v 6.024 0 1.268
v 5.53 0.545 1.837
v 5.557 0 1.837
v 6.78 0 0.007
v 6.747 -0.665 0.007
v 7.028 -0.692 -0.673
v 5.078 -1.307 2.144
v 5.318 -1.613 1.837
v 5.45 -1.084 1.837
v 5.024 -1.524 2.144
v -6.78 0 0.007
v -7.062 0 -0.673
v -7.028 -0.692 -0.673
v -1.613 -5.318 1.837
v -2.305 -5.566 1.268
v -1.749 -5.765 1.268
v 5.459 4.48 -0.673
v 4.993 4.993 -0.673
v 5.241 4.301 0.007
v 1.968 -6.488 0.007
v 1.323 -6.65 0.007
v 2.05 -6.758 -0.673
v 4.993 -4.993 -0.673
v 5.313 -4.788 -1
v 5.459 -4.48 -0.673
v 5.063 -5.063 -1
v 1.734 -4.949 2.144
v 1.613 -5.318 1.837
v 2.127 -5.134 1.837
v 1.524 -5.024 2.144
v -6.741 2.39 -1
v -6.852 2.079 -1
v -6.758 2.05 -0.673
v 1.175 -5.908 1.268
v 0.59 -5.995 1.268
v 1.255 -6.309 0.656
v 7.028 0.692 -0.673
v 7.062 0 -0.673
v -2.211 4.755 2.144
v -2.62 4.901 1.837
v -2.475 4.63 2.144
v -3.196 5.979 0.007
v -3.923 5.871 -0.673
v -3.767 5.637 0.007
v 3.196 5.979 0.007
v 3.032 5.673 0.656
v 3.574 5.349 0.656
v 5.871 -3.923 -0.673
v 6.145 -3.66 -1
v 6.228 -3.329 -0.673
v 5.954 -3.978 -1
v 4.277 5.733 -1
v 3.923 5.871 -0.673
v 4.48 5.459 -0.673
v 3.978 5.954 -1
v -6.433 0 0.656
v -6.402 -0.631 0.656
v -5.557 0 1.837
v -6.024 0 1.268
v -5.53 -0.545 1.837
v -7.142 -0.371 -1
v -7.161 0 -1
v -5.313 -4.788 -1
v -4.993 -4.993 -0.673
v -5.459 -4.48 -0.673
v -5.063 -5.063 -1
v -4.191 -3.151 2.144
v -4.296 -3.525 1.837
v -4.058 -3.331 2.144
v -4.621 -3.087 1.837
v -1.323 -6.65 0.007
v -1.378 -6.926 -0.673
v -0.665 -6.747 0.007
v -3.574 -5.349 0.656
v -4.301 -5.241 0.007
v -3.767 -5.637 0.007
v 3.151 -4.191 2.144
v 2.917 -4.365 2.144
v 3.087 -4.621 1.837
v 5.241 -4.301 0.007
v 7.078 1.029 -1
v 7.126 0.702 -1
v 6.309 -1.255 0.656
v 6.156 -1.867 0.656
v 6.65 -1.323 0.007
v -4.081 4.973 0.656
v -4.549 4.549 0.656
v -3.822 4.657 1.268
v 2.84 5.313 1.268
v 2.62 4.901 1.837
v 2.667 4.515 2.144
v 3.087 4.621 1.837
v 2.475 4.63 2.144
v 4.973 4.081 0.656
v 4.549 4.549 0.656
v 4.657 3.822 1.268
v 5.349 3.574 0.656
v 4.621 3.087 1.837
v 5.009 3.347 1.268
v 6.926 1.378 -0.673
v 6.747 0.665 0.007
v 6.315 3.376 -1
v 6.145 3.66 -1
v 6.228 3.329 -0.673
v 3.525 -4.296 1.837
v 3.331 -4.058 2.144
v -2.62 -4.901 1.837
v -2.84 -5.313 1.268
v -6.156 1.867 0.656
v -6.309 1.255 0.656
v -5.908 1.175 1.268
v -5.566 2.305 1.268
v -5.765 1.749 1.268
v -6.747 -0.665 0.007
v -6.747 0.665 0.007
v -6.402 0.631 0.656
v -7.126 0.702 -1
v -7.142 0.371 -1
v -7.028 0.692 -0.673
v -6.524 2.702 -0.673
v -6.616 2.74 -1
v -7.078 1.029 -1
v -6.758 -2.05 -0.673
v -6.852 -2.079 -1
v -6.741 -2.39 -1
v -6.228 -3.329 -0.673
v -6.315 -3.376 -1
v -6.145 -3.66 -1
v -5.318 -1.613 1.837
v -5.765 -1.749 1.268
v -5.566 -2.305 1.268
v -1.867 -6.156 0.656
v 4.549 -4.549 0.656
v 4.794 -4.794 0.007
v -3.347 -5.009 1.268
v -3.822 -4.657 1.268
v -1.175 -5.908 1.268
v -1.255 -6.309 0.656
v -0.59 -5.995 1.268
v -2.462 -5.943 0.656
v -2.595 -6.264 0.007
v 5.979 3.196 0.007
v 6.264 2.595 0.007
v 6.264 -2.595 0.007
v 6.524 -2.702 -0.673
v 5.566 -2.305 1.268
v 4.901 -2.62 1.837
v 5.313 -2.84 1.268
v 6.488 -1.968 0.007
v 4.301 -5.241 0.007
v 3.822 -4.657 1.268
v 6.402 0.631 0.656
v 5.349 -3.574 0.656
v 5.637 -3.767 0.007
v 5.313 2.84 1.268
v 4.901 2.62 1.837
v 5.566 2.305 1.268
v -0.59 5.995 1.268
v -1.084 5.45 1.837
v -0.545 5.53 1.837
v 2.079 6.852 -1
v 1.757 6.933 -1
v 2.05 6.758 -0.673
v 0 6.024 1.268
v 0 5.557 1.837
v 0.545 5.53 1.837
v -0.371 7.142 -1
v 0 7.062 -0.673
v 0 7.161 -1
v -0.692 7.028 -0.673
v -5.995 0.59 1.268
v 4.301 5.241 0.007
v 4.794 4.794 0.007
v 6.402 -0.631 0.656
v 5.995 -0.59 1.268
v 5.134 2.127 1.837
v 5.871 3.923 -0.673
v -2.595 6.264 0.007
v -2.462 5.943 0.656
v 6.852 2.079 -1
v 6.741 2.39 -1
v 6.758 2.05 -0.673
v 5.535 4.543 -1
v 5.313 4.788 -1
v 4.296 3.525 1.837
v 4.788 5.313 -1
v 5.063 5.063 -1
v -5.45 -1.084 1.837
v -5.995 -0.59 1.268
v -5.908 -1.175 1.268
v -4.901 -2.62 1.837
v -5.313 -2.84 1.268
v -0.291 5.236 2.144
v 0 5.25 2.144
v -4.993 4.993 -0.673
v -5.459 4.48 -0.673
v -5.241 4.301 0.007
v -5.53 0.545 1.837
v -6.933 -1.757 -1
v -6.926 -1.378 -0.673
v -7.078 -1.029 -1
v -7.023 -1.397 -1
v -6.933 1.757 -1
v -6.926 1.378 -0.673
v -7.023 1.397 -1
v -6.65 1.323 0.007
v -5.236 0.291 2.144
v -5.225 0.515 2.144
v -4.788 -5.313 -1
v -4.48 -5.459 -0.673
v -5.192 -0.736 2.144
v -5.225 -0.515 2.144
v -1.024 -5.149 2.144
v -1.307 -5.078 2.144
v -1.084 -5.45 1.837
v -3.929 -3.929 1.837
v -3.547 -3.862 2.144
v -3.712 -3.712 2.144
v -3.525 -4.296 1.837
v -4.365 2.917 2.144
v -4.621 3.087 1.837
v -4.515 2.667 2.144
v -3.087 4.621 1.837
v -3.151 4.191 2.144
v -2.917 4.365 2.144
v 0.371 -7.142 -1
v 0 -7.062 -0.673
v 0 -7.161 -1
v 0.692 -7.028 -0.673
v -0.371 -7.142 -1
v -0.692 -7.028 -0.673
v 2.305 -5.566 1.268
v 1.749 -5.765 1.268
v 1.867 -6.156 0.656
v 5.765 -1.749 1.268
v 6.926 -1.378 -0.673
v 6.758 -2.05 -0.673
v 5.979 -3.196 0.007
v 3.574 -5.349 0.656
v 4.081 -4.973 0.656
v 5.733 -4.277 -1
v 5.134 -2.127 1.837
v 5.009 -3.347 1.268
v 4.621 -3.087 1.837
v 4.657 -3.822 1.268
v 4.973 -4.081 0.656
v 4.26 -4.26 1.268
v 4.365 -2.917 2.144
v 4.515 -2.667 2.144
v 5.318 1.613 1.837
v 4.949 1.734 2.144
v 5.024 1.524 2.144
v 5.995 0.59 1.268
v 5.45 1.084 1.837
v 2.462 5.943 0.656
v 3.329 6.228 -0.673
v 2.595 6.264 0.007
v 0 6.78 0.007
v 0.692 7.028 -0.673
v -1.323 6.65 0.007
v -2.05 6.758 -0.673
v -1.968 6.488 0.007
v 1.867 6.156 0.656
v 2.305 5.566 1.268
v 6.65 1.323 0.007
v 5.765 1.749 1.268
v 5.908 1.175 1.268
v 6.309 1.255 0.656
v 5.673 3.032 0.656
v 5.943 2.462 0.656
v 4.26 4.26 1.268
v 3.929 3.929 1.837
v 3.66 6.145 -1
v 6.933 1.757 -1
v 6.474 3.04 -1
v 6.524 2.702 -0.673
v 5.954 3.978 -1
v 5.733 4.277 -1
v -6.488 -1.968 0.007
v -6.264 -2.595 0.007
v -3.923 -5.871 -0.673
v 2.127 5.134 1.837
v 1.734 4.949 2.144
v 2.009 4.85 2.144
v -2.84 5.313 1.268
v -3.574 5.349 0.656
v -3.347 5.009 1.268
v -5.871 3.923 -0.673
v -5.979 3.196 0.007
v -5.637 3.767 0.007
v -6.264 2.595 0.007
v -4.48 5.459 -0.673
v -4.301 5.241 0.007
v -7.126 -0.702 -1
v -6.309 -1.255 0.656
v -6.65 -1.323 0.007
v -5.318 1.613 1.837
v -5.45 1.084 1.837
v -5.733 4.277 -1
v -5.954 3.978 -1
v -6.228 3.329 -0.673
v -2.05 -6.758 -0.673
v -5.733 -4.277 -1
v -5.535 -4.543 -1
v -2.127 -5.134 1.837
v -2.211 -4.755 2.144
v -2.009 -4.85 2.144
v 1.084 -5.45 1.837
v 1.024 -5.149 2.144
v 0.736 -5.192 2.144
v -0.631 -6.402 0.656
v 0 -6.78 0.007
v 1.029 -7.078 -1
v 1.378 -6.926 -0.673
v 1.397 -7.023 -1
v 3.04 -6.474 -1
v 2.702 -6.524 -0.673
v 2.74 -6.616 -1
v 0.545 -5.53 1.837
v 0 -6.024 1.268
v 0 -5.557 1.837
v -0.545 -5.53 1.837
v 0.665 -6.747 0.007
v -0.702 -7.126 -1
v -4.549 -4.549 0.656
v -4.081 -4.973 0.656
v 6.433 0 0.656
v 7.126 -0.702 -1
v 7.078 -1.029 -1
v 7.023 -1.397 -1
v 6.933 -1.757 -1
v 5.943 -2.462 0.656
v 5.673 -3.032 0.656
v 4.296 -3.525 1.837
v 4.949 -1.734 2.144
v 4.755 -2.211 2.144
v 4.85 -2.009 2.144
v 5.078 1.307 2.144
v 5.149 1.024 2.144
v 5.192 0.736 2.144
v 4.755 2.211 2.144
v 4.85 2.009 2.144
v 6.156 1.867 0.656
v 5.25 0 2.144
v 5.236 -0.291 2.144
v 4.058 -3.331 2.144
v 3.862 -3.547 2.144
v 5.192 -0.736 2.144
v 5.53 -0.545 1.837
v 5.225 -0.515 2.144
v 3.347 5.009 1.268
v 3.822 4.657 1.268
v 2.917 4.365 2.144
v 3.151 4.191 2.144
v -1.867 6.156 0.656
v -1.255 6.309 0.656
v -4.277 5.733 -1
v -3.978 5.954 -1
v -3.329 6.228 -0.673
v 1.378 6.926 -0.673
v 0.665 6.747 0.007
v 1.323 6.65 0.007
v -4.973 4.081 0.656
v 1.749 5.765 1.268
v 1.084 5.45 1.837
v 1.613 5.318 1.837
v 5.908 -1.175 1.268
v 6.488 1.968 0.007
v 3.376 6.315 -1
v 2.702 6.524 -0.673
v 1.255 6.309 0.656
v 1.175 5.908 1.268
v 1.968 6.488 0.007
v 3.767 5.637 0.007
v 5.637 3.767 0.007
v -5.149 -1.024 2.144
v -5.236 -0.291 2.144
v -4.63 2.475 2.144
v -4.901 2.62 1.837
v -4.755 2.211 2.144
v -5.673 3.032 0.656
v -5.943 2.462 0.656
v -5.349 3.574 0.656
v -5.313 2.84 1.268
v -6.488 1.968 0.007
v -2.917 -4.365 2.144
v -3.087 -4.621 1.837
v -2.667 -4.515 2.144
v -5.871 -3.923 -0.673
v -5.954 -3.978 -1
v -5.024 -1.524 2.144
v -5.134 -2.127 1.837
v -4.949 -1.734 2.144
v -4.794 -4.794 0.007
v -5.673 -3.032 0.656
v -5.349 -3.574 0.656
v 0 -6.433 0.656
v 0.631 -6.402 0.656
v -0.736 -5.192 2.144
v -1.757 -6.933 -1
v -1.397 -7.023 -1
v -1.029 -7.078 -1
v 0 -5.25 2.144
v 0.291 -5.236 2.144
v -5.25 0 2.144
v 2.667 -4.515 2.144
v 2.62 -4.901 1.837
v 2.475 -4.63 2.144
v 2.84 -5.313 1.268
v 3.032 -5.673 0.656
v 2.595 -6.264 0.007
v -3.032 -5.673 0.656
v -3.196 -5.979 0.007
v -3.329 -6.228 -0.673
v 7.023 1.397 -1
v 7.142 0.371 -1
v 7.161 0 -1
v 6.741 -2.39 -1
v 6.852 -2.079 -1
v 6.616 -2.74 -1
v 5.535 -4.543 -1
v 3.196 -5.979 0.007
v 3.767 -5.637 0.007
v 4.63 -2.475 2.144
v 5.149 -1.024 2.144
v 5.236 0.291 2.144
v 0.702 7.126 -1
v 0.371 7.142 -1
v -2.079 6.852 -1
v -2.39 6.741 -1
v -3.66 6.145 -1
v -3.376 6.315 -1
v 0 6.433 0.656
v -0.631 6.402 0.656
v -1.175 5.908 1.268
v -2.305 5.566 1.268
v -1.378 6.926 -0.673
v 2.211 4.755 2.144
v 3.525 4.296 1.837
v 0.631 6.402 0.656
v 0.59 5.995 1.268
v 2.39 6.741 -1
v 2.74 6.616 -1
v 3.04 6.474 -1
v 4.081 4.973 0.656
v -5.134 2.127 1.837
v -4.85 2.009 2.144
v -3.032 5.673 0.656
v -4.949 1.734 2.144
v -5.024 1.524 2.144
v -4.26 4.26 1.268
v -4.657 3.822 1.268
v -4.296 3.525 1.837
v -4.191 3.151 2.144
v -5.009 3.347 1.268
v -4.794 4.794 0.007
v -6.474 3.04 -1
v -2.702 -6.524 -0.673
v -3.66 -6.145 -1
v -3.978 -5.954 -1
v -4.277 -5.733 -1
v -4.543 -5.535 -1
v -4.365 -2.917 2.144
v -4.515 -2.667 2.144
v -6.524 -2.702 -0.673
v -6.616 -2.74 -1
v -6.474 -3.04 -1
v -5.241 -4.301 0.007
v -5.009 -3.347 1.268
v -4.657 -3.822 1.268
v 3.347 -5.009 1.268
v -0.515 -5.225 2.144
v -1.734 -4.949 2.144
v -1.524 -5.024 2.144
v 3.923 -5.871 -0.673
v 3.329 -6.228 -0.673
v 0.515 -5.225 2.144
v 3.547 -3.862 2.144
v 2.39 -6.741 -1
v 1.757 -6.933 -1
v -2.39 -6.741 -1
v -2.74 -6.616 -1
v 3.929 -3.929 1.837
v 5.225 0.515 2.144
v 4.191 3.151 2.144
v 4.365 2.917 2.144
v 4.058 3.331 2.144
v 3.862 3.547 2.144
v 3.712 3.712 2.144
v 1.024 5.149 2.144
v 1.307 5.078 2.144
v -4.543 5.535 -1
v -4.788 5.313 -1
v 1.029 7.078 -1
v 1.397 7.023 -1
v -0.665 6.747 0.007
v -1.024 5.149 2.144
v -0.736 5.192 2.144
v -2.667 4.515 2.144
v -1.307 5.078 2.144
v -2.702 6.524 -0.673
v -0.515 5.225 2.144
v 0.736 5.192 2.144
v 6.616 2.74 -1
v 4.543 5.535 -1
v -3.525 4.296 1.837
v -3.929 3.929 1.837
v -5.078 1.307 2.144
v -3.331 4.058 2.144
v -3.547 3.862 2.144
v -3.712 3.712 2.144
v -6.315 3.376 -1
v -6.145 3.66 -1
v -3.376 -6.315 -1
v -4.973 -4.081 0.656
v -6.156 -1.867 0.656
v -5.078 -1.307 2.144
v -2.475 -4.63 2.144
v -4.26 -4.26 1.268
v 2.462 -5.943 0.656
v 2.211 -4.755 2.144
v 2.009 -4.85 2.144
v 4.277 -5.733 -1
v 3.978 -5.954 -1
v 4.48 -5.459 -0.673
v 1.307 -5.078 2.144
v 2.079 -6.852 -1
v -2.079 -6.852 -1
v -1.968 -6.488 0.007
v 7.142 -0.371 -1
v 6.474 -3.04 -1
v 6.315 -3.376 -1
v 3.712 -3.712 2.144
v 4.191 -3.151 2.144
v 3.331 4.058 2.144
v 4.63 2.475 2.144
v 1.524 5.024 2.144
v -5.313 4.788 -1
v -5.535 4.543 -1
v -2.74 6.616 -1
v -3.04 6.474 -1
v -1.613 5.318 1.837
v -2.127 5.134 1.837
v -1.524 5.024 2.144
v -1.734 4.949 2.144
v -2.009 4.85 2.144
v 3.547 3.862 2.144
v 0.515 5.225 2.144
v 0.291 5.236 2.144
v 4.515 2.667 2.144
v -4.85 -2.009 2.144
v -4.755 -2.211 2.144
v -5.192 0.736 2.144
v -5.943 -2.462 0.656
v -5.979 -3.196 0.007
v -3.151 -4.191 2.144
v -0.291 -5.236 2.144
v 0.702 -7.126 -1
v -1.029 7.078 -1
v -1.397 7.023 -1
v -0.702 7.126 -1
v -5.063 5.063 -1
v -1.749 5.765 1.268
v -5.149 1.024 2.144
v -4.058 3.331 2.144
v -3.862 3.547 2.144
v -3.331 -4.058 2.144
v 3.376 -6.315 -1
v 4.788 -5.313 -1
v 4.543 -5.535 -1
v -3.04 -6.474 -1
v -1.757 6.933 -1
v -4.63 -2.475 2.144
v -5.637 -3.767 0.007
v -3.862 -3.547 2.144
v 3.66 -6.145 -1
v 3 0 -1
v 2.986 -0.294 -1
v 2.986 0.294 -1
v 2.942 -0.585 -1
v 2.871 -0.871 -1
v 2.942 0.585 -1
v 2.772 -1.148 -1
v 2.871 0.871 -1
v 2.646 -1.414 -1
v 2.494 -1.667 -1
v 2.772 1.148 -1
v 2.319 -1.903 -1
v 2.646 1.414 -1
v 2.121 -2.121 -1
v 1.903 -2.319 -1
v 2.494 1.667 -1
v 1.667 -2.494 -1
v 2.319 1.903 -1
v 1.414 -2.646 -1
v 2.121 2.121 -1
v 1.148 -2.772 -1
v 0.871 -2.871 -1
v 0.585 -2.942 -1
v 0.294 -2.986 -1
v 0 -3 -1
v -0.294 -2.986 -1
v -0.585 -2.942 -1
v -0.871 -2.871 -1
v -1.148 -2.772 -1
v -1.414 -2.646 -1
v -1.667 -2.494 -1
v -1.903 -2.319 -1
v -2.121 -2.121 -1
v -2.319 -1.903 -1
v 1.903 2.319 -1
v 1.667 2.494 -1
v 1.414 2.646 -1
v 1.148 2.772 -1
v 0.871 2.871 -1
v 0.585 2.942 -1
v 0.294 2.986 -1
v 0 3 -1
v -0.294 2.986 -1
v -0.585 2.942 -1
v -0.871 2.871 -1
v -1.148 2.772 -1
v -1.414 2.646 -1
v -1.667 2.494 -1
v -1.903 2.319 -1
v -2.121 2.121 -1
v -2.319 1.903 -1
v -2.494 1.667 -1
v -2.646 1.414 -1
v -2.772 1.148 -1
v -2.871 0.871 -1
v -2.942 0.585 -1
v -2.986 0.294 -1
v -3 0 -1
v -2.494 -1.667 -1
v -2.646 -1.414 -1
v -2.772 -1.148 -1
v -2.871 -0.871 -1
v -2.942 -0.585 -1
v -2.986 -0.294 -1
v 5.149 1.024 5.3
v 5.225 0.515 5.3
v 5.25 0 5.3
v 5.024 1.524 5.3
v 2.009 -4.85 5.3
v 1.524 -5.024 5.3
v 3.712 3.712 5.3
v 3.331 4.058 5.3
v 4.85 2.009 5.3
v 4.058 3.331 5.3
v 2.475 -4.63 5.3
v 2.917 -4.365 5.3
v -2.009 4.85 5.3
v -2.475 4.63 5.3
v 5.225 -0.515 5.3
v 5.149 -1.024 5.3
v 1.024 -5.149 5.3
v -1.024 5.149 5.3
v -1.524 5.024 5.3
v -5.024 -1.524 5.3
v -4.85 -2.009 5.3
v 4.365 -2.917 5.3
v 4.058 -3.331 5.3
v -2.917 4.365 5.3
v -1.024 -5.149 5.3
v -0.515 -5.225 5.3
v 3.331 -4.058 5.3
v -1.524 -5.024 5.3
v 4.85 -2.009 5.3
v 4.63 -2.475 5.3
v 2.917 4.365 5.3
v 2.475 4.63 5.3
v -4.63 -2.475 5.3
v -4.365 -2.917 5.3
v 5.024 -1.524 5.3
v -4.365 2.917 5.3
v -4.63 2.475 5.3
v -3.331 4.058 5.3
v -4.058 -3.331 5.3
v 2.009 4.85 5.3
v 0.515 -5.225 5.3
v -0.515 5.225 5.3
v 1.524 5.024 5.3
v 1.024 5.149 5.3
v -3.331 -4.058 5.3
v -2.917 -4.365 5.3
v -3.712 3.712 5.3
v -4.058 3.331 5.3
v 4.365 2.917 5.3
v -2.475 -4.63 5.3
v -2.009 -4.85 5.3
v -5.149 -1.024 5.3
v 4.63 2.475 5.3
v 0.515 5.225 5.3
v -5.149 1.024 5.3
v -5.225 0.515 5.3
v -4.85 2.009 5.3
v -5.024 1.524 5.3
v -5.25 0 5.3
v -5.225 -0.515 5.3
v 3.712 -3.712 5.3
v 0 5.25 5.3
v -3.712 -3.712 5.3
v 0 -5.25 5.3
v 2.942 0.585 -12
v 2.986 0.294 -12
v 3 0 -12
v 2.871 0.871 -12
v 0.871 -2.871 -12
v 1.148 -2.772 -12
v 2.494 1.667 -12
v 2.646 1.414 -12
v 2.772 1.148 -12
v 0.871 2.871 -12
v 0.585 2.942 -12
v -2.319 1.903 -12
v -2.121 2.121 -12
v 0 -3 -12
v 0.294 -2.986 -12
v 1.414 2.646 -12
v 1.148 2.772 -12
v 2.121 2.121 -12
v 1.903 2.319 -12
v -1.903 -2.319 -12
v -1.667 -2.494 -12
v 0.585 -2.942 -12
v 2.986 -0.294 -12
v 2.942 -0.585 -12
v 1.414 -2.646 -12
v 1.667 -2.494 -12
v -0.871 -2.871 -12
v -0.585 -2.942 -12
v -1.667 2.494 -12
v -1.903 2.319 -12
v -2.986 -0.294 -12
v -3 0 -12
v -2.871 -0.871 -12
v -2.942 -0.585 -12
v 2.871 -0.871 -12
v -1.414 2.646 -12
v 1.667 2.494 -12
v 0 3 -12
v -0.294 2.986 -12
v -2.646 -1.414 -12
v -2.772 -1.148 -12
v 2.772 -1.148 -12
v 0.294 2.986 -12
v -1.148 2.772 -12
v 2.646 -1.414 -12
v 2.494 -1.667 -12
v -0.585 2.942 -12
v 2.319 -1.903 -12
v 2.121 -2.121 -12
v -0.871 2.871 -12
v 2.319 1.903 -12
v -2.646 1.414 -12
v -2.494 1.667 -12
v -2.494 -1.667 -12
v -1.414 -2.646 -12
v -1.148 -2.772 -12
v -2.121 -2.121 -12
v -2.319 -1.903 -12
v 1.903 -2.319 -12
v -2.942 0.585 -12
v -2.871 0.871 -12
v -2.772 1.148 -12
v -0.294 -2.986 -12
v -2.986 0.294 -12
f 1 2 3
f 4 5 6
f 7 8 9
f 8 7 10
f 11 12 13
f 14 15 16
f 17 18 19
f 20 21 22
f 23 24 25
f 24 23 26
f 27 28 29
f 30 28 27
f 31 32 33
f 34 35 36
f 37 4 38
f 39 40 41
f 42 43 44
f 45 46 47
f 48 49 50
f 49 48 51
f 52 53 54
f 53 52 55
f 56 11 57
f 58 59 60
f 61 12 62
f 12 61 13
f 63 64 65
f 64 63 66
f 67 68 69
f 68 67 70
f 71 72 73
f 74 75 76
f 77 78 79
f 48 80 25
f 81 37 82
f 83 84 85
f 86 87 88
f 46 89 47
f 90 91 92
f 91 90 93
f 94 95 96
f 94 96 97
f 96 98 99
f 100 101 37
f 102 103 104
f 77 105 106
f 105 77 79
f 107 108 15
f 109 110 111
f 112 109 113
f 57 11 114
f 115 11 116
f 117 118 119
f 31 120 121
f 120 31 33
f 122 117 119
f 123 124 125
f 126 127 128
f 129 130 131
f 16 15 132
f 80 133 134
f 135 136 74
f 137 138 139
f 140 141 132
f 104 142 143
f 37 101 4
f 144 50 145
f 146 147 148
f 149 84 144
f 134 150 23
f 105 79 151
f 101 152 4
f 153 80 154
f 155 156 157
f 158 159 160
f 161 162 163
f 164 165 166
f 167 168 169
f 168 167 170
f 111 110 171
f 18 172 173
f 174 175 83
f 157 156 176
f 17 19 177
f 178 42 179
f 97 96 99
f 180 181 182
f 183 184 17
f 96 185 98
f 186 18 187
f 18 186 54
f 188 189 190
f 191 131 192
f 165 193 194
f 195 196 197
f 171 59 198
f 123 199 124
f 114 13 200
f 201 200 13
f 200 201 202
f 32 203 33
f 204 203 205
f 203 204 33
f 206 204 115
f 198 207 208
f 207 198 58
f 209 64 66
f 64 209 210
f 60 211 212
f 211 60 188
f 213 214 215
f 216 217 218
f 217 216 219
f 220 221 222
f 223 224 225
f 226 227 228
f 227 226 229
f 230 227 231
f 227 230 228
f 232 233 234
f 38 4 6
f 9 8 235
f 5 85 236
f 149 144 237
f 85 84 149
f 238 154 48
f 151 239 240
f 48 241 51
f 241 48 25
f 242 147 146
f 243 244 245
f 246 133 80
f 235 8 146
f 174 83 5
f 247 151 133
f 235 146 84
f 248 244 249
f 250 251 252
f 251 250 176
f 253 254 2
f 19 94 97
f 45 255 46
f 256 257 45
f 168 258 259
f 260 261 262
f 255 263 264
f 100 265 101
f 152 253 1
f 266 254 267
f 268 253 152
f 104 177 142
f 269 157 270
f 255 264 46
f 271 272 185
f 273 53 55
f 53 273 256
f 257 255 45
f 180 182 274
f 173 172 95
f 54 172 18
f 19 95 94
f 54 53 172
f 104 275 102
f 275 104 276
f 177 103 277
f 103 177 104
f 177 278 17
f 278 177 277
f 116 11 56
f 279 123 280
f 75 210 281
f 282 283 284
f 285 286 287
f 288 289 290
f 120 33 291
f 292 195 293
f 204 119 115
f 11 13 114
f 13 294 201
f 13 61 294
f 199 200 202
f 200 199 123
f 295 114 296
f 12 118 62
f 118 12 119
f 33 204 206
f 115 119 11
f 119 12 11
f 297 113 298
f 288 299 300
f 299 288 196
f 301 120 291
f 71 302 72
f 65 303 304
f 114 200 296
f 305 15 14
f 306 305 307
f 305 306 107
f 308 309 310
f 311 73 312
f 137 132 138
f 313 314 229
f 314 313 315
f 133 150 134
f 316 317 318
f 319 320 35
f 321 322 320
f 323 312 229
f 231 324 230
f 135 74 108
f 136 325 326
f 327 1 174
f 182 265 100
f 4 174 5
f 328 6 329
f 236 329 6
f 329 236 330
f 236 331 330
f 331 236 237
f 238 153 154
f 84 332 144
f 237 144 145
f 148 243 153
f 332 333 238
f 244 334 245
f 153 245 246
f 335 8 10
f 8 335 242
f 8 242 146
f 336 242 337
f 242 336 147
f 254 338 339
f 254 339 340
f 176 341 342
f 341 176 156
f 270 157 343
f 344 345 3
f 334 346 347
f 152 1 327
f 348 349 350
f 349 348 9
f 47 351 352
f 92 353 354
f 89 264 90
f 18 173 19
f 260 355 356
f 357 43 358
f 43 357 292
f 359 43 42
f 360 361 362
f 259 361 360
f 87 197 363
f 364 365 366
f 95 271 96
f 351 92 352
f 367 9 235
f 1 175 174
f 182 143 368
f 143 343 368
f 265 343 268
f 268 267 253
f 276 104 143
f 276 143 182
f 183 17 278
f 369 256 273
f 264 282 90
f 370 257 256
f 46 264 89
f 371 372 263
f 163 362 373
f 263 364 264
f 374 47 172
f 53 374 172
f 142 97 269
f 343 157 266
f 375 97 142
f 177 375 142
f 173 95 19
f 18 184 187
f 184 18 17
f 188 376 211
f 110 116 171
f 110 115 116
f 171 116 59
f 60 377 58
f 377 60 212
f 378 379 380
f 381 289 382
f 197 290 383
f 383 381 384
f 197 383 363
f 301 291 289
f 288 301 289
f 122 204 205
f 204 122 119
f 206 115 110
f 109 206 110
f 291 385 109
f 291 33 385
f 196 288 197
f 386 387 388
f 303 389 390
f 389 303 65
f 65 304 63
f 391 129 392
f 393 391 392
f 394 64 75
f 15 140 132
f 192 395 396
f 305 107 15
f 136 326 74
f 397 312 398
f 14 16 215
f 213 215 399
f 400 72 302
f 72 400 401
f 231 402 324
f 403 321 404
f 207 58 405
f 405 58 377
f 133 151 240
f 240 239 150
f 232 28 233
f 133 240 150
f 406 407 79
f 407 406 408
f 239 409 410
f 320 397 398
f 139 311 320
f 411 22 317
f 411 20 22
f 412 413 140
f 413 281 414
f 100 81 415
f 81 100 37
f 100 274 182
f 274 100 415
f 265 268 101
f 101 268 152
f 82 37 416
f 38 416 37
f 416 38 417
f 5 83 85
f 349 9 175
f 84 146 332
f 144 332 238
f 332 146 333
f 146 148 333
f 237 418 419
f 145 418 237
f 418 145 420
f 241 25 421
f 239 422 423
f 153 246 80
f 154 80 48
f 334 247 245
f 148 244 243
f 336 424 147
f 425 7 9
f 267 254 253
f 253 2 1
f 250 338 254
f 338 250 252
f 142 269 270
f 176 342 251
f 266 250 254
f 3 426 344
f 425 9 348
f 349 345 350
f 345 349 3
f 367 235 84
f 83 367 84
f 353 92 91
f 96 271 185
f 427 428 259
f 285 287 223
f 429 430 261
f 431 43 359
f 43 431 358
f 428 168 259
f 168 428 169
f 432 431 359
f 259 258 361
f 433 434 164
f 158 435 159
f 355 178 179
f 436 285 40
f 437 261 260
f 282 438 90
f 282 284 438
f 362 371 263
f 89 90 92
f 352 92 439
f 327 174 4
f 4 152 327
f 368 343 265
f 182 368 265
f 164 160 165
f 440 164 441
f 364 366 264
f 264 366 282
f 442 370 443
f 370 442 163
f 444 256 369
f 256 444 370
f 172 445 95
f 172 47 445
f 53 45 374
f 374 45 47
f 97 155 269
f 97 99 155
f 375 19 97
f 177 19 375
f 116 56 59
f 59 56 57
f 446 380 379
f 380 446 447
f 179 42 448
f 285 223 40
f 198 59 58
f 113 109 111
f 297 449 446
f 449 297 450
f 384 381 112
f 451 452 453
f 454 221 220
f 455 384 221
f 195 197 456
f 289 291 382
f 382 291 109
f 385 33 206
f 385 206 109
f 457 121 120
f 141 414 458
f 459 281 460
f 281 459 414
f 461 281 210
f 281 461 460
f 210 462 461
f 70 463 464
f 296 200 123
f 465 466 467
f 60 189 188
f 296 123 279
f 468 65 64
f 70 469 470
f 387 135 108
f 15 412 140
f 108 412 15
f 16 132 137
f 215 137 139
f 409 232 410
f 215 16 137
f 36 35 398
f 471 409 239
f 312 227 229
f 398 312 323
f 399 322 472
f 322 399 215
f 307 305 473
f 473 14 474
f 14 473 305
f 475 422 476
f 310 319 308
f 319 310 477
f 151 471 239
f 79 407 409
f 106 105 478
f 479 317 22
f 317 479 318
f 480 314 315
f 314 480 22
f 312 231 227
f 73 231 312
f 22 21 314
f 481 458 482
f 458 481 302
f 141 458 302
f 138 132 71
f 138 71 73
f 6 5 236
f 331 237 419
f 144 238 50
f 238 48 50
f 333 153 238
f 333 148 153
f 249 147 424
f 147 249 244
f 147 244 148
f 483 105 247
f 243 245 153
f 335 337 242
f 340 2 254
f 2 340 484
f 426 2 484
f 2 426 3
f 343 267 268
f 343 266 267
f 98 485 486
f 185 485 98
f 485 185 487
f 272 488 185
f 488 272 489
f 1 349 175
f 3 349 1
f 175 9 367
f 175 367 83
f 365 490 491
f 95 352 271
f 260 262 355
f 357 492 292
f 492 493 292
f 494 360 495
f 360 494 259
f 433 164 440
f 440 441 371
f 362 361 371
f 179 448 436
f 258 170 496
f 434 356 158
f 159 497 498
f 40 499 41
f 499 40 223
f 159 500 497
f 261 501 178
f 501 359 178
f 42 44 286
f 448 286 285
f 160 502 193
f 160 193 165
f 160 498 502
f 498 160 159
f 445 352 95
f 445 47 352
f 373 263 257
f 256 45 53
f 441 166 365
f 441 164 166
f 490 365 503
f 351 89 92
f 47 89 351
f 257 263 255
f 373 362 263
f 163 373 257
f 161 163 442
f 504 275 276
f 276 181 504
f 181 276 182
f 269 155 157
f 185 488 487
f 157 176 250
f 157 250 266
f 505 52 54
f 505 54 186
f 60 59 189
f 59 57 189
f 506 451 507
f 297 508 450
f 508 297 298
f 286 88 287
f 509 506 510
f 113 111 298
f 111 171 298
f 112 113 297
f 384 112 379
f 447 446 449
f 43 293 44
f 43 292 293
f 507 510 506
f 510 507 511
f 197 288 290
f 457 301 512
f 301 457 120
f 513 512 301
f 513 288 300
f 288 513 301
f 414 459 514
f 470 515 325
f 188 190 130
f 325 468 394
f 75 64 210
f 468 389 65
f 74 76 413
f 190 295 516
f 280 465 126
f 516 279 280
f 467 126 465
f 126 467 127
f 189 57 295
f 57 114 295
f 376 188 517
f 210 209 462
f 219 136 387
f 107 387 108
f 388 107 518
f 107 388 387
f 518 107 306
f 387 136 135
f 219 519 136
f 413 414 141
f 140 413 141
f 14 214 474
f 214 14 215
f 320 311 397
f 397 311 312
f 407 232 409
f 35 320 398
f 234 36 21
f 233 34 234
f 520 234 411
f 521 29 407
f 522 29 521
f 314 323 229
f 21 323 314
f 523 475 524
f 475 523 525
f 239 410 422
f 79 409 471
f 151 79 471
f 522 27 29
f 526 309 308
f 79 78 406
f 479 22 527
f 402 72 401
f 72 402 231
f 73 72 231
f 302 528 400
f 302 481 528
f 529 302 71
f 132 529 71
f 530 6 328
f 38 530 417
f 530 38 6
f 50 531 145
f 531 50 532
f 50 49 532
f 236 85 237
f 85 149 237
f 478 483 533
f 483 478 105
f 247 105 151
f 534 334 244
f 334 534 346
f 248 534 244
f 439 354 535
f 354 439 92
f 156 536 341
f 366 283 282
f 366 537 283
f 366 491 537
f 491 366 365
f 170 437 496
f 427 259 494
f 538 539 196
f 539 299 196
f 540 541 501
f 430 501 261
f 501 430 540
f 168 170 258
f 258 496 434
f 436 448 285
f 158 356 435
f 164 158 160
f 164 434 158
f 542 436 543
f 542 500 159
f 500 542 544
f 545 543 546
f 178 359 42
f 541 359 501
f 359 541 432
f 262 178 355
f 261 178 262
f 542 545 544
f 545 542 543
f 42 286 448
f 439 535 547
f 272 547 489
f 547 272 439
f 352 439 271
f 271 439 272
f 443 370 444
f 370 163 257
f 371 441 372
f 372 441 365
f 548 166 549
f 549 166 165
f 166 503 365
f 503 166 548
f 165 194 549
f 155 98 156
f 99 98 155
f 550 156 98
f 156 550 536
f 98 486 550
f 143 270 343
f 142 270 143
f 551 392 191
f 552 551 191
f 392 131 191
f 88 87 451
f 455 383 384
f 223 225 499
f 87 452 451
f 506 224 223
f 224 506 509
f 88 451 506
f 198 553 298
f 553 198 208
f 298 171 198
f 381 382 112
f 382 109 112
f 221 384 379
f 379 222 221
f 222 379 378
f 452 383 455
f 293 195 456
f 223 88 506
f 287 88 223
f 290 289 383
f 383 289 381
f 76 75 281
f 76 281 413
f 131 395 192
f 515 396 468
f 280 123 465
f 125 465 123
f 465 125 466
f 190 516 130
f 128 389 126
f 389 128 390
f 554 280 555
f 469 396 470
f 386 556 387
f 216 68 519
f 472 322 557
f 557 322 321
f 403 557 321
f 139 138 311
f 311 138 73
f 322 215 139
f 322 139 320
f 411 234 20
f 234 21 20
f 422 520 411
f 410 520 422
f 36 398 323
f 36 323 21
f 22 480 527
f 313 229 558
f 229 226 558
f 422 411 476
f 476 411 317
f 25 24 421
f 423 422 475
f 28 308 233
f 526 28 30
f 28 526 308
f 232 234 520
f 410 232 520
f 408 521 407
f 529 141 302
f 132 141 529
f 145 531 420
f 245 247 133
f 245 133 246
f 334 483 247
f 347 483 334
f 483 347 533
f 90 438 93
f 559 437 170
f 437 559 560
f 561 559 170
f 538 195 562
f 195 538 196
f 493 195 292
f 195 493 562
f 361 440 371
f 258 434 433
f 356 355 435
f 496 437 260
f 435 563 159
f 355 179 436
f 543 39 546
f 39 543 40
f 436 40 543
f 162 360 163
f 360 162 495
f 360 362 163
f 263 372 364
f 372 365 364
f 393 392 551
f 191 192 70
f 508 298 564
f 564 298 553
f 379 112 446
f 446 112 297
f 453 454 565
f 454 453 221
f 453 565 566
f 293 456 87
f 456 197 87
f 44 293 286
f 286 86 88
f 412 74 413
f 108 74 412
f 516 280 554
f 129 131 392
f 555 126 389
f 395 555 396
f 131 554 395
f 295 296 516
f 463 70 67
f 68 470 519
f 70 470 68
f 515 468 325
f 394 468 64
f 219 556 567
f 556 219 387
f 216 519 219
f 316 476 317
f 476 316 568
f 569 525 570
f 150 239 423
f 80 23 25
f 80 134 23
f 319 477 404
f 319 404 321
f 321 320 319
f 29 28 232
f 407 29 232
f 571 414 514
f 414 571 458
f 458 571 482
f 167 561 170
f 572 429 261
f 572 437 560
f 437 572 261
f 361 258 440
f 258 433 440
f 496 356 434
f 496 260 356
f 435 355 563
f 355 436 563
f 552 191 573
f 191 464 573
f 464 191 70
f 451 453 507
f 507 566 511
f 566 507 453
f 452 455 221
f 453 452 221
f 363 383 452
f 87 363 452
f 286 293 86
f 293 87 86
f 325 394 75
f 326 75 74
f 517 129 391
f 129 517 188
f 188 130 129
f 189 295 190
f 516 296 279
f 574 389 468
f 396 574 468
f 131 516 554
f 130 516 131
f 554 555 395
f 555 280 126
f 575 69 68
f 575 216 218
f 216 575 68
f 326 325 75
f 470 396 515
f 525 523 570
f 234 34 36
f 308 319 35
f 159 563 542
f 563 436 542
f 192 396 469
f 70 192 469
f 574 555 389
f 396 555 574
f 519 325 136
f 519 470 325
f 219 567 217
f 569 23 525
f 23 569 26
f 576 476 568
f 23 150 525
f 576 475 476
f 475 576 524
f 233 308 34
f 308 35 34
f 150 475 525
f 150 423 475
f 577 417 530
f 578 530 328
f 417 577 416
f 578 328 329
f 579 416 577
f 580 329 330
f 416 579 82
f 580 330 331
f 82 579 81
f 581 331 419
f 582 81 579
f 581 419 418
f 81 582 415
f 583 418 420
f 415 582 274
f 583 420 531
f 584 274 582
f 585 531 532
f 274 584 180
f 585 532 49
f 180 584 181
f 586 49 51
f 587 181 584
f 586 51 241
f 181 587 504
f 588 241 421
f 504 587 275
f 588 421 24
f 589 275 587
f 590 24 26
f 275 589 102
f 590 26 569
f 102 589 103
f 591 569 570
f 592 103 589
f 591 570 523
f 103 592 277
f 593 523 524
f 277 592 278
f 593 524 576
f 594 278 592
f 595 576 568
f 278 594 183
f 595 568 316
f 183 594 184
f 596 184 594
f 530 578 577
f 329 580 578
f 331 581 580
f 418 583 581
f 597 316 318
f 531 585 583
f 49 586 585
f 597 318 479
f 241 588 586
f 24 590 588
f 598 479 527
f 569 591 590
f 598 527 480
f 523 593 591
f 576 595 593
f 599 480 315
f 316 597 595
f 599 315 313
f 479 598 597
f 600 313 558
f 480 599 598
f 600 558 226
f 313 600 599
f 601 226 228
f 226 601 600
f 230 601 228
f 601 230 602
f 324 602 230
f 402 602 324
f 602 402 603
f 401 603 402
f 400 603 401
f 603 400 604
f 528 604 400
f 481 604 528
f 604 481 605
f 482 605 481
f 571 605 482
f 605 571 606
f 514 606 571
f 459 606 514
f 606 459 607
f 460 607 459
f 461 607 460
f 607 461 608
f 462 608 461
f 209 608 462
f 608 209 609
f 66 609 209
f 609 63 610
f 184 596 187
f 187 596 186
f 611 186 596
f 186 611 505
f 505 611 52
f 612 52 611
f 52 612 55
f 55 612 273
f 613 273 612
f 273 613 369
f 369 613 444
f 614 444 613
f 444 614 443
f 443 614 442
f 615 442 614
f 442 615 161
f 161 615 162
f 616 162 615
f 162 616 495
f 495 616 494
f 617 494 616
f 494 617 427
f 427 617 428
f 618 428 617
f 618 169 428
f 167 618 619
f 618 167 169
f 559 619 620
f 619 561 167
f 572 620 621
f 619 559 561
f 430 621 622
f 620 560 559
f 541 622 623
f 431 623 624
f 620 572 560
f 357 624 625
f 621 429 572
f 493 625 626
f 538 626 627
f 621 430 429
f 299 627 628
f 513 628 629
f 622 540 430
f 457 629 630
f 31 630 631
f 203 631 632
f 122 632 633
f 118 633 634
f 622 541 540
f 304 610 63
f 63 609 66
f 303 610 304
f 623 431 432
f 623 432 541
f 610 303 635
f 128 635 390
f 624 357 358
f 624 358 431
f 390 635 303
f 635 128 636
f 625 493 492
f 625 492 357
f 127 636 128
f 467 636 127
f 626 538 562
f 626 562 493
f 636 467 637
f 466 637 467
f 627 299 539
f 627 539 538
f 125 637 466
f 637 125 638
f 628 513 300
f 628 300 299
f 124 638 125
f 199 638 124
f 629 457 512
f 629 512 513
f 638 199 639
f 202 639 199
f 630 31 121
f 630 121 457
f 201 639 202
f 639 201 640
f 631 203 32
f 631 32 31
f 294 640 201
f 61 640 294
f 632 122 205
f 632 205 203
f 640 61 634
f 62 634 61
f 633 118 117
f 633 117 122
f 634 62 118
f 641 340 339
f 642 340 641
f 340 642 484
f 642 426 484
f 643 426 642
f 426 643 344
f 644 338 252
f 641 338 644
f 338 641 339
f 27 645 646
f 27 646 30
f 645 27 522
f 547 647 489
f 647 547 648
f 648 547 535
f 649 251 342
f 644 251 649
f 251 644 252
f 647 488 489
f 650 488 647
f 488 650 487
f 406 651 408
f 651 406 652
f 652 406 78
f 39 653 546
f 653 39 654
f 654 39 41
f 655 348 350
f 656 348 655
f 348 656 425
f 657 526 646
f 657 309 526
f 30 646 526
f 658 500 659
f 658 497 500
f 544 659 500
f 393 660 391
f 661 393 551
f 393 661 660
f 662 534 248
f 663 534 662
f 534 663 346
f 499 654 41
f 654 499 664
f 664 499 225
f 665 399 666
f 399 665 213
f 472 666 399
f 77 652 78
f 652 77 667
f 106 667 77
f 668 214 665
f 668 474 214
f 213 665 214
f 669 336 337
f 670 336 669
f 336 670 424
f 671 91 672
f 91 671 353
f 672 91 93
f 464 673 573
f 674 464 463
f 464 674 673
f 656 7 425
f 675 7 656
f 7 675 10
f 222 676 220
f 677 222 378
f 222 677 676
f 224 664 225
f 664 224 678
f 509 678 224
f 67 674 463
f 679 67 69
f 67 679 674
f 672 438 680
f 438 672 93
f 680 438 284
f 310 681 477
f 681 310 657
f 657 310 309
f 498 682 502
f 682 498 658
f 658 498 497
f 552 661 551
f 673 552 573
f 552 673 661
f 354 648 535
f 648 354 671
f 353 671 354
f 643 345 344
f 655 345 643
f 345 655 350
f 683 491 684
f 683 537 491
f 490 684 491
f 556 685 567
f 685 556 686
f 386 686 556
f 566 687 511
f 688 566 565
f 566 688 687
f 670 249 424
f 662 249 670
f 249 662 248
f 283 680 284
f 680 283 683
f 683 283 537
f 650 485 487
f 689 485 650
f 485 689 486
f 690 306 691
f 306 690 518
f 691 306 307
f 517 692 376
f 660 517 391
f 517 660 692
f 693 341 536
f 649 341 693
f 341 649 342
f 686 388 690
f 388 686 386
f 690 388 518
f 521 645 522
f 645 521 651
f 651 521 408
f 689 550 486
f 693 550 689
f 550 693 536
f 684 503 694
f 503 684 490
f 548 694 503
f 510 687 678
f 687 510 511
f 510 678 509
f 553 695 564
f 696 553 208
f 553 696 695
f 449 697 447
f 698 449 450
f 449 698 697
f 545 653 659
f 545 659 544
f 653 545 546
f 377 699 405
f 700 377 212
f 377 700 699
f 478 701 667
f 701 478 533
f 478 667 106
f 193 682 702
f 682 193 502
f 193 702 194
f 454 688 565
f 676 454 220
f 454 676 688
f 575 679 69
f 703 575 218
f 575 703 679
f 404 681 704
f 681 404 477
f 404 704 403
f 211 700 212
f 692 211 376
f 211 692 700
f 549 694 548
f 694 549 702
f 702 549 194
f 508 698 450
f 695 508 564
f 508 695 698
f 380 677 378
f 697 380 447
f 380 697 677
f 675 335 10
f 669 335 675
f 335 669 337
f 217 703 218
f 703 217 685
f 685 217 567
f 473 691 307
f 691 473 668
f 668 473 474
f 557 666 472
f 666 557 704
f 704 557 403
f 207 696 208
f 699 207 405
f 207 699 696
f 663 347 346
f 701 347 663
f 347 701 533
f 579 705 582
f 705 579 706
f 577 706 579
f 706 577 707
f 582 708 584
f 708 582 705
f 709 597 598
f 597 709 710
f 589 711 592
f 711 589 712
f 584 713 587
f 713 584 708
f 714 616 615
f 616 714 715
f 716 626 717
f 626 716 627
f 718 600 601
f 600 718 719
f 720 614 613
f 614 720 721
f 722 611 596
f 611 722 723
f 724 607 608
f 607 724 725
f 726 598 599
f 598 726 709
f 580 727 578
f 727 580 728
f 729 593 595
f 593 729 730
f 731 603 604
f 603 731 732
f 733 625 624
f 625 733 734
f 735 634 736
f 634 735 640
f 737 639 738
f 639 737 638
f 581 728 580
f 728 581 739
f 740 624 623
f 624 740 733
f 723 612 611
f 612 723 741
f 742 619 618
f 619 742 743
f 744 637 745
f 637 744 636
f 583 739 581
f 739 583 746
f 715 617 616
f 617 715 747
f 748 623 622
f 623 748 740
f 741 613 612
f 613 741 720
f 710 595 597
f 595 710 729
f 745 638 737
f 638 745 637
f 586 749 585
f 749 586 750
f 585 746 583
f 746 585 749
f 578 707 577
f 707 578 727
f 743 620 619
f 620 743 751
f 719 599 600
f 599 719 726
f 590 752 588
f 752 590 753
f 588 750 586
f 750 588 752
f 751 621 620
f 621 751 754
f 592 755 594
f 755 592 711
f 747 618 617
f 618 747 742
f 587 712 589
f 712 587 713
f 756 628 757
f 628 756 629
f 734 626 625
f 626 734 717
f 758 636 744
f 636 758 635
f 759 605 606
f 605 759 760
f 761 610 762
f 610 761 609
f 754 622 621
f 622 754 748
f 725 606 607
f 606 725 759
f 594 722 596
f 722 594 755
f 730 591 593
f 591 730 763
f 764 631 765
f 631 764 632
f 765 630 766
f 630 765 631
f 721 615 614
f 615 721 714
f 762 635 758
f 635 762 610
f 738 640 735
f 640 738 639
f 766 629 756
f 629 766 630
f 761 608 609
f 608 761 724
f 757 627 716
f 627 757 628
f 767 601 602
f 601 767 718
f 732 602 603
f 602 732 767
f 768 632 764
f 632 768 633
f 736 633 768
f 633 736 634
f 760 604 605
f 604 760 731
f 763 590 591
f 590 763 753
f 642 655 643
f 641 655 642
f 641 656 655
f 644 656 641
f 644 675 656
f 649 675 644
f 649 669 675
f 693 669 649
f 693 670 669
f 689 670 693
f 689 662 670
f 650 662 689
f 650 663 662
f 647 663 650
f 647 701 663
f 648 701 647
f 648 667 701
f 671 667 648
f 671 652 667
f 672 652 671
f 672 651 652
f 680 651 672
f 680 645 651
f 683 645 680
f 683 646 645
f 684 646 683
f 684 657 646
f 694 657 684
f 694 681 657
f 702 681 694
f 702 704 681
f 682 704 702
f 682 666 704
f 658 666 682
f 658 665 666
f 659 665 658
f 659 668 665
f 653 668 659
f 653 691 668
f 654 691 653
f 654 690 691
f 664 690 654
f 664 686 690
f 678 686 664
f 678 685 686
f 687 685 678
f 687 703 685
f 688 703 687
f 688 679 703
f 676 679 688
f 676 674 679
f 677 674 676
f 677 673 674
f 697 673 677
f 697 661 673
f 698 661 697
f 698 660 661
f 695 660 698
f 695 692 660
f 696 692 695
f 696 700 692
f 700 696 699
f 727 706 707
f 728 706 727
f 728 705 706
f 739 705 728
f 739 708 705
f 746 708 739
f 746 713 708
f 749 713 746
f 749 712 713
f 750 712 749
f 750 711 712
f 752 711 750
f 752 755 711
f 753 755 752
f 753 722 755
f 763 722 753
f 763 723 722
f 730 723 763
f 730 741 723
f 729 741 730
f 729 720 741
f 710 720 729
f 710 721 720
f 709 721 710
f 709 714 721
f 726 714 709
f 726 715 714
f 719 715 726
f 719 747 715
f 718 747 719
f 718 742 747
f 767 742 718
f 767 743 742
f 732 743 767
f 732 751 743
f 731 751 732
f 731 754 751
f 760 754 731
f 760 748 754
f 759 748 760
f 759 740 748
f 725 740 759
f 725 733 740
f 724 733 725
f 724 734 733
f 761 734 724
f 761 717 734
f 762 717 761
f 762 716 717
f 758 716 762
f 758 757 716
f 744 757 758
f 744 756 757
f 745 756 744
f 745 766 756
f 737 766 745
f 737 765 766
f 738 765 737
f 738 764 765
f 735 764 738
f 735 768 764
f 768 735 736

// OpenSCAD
// Parameters
shaft_diameter_mm = 6; //[3:12:0.1]
head_diameter_mm  = 10.5; //[5.25:21:0.1]
head_height_mm    = 3.3; //[1.65:6.6:0.1]
length_mm         = 10; //[5:20:0.5]
dome_sphere_radius_mm = 7.5; //[4:15:0.1]
overlap_mm        = 1; //[0.5:2:0.1]

// Screw (single connected solid)
module screw() {
  union() {
    // Place head so its bottom is at z=0 and top at z=head_height_mm
    // This makes it easy to attach shaft below and any cap above.
    // Head (cylindrical portion)
    translate([0, 0, head_height_mm/2])
      cylinder(h=head_height_mm, r=head_diameter_mm/2, center=true, $fn=64);

    // Dome (spherical cap) - intersects head by overlap_mm to avoid any gap
    intersection() {
      // Sphere positioned so it creates a dome over the head top
      translate([0, 0, head_height_mm - dome_sphere_radius_mm + overlap_mm])
        sphere(r=dome_sphere_radius_mm, $fn=64);

      // Limit dome to the head height region (slightly extended for robust overlap)
      translate([0, 0, head_height_mm/2])
        cube([head_diameter_mm*3, head_diameter_mm*3, head_height_mm + 2*overlap_mm], center=true);
    }

    // Shaft - attached to head bottom with overlap
    // Shaft spans from z = -length_mm to z = 0, but overlaps into head by overlap_mm
    translate([0, 0, -length_mm/2 + overlap_mm/2])
      cylinder(h=length_mm + overlap_mm, r=shaft_diameter_mm/2, center=true, $fn=64);

    // Top cylindrical segment (cap) - MUST be attached to head/dome (fix floating top part)
    // Sits above head top and overlaps downward into the head by overlap_mm
    top_cap_h = 2; // small segment as seen in top view
    translate([0, 0, head_height_mm + top_cap_h/2 - overlap_mm/2])
      cylinder(h=top_cap_h + overlap_mm, r=head_diameter_mm/2, center=true, $fn=64);

    // Bottom cylindrical segment - MUST be attached to shaft (fix floating bottom part)
    // Sits below shaft end and overlaps upward into the shaft by overlap_mm
    bottom_cap_h = 2; // small segment as seen in bottom view
    translate([0, 0, -length_mm - bottom_cap_h/2 + overlap_mm/2])
      cylinder(h=bottom_cap_h + overlap_mm, r=shaft_diameter_mm/2, center=true, $fn=64);
  }
}

screw();
